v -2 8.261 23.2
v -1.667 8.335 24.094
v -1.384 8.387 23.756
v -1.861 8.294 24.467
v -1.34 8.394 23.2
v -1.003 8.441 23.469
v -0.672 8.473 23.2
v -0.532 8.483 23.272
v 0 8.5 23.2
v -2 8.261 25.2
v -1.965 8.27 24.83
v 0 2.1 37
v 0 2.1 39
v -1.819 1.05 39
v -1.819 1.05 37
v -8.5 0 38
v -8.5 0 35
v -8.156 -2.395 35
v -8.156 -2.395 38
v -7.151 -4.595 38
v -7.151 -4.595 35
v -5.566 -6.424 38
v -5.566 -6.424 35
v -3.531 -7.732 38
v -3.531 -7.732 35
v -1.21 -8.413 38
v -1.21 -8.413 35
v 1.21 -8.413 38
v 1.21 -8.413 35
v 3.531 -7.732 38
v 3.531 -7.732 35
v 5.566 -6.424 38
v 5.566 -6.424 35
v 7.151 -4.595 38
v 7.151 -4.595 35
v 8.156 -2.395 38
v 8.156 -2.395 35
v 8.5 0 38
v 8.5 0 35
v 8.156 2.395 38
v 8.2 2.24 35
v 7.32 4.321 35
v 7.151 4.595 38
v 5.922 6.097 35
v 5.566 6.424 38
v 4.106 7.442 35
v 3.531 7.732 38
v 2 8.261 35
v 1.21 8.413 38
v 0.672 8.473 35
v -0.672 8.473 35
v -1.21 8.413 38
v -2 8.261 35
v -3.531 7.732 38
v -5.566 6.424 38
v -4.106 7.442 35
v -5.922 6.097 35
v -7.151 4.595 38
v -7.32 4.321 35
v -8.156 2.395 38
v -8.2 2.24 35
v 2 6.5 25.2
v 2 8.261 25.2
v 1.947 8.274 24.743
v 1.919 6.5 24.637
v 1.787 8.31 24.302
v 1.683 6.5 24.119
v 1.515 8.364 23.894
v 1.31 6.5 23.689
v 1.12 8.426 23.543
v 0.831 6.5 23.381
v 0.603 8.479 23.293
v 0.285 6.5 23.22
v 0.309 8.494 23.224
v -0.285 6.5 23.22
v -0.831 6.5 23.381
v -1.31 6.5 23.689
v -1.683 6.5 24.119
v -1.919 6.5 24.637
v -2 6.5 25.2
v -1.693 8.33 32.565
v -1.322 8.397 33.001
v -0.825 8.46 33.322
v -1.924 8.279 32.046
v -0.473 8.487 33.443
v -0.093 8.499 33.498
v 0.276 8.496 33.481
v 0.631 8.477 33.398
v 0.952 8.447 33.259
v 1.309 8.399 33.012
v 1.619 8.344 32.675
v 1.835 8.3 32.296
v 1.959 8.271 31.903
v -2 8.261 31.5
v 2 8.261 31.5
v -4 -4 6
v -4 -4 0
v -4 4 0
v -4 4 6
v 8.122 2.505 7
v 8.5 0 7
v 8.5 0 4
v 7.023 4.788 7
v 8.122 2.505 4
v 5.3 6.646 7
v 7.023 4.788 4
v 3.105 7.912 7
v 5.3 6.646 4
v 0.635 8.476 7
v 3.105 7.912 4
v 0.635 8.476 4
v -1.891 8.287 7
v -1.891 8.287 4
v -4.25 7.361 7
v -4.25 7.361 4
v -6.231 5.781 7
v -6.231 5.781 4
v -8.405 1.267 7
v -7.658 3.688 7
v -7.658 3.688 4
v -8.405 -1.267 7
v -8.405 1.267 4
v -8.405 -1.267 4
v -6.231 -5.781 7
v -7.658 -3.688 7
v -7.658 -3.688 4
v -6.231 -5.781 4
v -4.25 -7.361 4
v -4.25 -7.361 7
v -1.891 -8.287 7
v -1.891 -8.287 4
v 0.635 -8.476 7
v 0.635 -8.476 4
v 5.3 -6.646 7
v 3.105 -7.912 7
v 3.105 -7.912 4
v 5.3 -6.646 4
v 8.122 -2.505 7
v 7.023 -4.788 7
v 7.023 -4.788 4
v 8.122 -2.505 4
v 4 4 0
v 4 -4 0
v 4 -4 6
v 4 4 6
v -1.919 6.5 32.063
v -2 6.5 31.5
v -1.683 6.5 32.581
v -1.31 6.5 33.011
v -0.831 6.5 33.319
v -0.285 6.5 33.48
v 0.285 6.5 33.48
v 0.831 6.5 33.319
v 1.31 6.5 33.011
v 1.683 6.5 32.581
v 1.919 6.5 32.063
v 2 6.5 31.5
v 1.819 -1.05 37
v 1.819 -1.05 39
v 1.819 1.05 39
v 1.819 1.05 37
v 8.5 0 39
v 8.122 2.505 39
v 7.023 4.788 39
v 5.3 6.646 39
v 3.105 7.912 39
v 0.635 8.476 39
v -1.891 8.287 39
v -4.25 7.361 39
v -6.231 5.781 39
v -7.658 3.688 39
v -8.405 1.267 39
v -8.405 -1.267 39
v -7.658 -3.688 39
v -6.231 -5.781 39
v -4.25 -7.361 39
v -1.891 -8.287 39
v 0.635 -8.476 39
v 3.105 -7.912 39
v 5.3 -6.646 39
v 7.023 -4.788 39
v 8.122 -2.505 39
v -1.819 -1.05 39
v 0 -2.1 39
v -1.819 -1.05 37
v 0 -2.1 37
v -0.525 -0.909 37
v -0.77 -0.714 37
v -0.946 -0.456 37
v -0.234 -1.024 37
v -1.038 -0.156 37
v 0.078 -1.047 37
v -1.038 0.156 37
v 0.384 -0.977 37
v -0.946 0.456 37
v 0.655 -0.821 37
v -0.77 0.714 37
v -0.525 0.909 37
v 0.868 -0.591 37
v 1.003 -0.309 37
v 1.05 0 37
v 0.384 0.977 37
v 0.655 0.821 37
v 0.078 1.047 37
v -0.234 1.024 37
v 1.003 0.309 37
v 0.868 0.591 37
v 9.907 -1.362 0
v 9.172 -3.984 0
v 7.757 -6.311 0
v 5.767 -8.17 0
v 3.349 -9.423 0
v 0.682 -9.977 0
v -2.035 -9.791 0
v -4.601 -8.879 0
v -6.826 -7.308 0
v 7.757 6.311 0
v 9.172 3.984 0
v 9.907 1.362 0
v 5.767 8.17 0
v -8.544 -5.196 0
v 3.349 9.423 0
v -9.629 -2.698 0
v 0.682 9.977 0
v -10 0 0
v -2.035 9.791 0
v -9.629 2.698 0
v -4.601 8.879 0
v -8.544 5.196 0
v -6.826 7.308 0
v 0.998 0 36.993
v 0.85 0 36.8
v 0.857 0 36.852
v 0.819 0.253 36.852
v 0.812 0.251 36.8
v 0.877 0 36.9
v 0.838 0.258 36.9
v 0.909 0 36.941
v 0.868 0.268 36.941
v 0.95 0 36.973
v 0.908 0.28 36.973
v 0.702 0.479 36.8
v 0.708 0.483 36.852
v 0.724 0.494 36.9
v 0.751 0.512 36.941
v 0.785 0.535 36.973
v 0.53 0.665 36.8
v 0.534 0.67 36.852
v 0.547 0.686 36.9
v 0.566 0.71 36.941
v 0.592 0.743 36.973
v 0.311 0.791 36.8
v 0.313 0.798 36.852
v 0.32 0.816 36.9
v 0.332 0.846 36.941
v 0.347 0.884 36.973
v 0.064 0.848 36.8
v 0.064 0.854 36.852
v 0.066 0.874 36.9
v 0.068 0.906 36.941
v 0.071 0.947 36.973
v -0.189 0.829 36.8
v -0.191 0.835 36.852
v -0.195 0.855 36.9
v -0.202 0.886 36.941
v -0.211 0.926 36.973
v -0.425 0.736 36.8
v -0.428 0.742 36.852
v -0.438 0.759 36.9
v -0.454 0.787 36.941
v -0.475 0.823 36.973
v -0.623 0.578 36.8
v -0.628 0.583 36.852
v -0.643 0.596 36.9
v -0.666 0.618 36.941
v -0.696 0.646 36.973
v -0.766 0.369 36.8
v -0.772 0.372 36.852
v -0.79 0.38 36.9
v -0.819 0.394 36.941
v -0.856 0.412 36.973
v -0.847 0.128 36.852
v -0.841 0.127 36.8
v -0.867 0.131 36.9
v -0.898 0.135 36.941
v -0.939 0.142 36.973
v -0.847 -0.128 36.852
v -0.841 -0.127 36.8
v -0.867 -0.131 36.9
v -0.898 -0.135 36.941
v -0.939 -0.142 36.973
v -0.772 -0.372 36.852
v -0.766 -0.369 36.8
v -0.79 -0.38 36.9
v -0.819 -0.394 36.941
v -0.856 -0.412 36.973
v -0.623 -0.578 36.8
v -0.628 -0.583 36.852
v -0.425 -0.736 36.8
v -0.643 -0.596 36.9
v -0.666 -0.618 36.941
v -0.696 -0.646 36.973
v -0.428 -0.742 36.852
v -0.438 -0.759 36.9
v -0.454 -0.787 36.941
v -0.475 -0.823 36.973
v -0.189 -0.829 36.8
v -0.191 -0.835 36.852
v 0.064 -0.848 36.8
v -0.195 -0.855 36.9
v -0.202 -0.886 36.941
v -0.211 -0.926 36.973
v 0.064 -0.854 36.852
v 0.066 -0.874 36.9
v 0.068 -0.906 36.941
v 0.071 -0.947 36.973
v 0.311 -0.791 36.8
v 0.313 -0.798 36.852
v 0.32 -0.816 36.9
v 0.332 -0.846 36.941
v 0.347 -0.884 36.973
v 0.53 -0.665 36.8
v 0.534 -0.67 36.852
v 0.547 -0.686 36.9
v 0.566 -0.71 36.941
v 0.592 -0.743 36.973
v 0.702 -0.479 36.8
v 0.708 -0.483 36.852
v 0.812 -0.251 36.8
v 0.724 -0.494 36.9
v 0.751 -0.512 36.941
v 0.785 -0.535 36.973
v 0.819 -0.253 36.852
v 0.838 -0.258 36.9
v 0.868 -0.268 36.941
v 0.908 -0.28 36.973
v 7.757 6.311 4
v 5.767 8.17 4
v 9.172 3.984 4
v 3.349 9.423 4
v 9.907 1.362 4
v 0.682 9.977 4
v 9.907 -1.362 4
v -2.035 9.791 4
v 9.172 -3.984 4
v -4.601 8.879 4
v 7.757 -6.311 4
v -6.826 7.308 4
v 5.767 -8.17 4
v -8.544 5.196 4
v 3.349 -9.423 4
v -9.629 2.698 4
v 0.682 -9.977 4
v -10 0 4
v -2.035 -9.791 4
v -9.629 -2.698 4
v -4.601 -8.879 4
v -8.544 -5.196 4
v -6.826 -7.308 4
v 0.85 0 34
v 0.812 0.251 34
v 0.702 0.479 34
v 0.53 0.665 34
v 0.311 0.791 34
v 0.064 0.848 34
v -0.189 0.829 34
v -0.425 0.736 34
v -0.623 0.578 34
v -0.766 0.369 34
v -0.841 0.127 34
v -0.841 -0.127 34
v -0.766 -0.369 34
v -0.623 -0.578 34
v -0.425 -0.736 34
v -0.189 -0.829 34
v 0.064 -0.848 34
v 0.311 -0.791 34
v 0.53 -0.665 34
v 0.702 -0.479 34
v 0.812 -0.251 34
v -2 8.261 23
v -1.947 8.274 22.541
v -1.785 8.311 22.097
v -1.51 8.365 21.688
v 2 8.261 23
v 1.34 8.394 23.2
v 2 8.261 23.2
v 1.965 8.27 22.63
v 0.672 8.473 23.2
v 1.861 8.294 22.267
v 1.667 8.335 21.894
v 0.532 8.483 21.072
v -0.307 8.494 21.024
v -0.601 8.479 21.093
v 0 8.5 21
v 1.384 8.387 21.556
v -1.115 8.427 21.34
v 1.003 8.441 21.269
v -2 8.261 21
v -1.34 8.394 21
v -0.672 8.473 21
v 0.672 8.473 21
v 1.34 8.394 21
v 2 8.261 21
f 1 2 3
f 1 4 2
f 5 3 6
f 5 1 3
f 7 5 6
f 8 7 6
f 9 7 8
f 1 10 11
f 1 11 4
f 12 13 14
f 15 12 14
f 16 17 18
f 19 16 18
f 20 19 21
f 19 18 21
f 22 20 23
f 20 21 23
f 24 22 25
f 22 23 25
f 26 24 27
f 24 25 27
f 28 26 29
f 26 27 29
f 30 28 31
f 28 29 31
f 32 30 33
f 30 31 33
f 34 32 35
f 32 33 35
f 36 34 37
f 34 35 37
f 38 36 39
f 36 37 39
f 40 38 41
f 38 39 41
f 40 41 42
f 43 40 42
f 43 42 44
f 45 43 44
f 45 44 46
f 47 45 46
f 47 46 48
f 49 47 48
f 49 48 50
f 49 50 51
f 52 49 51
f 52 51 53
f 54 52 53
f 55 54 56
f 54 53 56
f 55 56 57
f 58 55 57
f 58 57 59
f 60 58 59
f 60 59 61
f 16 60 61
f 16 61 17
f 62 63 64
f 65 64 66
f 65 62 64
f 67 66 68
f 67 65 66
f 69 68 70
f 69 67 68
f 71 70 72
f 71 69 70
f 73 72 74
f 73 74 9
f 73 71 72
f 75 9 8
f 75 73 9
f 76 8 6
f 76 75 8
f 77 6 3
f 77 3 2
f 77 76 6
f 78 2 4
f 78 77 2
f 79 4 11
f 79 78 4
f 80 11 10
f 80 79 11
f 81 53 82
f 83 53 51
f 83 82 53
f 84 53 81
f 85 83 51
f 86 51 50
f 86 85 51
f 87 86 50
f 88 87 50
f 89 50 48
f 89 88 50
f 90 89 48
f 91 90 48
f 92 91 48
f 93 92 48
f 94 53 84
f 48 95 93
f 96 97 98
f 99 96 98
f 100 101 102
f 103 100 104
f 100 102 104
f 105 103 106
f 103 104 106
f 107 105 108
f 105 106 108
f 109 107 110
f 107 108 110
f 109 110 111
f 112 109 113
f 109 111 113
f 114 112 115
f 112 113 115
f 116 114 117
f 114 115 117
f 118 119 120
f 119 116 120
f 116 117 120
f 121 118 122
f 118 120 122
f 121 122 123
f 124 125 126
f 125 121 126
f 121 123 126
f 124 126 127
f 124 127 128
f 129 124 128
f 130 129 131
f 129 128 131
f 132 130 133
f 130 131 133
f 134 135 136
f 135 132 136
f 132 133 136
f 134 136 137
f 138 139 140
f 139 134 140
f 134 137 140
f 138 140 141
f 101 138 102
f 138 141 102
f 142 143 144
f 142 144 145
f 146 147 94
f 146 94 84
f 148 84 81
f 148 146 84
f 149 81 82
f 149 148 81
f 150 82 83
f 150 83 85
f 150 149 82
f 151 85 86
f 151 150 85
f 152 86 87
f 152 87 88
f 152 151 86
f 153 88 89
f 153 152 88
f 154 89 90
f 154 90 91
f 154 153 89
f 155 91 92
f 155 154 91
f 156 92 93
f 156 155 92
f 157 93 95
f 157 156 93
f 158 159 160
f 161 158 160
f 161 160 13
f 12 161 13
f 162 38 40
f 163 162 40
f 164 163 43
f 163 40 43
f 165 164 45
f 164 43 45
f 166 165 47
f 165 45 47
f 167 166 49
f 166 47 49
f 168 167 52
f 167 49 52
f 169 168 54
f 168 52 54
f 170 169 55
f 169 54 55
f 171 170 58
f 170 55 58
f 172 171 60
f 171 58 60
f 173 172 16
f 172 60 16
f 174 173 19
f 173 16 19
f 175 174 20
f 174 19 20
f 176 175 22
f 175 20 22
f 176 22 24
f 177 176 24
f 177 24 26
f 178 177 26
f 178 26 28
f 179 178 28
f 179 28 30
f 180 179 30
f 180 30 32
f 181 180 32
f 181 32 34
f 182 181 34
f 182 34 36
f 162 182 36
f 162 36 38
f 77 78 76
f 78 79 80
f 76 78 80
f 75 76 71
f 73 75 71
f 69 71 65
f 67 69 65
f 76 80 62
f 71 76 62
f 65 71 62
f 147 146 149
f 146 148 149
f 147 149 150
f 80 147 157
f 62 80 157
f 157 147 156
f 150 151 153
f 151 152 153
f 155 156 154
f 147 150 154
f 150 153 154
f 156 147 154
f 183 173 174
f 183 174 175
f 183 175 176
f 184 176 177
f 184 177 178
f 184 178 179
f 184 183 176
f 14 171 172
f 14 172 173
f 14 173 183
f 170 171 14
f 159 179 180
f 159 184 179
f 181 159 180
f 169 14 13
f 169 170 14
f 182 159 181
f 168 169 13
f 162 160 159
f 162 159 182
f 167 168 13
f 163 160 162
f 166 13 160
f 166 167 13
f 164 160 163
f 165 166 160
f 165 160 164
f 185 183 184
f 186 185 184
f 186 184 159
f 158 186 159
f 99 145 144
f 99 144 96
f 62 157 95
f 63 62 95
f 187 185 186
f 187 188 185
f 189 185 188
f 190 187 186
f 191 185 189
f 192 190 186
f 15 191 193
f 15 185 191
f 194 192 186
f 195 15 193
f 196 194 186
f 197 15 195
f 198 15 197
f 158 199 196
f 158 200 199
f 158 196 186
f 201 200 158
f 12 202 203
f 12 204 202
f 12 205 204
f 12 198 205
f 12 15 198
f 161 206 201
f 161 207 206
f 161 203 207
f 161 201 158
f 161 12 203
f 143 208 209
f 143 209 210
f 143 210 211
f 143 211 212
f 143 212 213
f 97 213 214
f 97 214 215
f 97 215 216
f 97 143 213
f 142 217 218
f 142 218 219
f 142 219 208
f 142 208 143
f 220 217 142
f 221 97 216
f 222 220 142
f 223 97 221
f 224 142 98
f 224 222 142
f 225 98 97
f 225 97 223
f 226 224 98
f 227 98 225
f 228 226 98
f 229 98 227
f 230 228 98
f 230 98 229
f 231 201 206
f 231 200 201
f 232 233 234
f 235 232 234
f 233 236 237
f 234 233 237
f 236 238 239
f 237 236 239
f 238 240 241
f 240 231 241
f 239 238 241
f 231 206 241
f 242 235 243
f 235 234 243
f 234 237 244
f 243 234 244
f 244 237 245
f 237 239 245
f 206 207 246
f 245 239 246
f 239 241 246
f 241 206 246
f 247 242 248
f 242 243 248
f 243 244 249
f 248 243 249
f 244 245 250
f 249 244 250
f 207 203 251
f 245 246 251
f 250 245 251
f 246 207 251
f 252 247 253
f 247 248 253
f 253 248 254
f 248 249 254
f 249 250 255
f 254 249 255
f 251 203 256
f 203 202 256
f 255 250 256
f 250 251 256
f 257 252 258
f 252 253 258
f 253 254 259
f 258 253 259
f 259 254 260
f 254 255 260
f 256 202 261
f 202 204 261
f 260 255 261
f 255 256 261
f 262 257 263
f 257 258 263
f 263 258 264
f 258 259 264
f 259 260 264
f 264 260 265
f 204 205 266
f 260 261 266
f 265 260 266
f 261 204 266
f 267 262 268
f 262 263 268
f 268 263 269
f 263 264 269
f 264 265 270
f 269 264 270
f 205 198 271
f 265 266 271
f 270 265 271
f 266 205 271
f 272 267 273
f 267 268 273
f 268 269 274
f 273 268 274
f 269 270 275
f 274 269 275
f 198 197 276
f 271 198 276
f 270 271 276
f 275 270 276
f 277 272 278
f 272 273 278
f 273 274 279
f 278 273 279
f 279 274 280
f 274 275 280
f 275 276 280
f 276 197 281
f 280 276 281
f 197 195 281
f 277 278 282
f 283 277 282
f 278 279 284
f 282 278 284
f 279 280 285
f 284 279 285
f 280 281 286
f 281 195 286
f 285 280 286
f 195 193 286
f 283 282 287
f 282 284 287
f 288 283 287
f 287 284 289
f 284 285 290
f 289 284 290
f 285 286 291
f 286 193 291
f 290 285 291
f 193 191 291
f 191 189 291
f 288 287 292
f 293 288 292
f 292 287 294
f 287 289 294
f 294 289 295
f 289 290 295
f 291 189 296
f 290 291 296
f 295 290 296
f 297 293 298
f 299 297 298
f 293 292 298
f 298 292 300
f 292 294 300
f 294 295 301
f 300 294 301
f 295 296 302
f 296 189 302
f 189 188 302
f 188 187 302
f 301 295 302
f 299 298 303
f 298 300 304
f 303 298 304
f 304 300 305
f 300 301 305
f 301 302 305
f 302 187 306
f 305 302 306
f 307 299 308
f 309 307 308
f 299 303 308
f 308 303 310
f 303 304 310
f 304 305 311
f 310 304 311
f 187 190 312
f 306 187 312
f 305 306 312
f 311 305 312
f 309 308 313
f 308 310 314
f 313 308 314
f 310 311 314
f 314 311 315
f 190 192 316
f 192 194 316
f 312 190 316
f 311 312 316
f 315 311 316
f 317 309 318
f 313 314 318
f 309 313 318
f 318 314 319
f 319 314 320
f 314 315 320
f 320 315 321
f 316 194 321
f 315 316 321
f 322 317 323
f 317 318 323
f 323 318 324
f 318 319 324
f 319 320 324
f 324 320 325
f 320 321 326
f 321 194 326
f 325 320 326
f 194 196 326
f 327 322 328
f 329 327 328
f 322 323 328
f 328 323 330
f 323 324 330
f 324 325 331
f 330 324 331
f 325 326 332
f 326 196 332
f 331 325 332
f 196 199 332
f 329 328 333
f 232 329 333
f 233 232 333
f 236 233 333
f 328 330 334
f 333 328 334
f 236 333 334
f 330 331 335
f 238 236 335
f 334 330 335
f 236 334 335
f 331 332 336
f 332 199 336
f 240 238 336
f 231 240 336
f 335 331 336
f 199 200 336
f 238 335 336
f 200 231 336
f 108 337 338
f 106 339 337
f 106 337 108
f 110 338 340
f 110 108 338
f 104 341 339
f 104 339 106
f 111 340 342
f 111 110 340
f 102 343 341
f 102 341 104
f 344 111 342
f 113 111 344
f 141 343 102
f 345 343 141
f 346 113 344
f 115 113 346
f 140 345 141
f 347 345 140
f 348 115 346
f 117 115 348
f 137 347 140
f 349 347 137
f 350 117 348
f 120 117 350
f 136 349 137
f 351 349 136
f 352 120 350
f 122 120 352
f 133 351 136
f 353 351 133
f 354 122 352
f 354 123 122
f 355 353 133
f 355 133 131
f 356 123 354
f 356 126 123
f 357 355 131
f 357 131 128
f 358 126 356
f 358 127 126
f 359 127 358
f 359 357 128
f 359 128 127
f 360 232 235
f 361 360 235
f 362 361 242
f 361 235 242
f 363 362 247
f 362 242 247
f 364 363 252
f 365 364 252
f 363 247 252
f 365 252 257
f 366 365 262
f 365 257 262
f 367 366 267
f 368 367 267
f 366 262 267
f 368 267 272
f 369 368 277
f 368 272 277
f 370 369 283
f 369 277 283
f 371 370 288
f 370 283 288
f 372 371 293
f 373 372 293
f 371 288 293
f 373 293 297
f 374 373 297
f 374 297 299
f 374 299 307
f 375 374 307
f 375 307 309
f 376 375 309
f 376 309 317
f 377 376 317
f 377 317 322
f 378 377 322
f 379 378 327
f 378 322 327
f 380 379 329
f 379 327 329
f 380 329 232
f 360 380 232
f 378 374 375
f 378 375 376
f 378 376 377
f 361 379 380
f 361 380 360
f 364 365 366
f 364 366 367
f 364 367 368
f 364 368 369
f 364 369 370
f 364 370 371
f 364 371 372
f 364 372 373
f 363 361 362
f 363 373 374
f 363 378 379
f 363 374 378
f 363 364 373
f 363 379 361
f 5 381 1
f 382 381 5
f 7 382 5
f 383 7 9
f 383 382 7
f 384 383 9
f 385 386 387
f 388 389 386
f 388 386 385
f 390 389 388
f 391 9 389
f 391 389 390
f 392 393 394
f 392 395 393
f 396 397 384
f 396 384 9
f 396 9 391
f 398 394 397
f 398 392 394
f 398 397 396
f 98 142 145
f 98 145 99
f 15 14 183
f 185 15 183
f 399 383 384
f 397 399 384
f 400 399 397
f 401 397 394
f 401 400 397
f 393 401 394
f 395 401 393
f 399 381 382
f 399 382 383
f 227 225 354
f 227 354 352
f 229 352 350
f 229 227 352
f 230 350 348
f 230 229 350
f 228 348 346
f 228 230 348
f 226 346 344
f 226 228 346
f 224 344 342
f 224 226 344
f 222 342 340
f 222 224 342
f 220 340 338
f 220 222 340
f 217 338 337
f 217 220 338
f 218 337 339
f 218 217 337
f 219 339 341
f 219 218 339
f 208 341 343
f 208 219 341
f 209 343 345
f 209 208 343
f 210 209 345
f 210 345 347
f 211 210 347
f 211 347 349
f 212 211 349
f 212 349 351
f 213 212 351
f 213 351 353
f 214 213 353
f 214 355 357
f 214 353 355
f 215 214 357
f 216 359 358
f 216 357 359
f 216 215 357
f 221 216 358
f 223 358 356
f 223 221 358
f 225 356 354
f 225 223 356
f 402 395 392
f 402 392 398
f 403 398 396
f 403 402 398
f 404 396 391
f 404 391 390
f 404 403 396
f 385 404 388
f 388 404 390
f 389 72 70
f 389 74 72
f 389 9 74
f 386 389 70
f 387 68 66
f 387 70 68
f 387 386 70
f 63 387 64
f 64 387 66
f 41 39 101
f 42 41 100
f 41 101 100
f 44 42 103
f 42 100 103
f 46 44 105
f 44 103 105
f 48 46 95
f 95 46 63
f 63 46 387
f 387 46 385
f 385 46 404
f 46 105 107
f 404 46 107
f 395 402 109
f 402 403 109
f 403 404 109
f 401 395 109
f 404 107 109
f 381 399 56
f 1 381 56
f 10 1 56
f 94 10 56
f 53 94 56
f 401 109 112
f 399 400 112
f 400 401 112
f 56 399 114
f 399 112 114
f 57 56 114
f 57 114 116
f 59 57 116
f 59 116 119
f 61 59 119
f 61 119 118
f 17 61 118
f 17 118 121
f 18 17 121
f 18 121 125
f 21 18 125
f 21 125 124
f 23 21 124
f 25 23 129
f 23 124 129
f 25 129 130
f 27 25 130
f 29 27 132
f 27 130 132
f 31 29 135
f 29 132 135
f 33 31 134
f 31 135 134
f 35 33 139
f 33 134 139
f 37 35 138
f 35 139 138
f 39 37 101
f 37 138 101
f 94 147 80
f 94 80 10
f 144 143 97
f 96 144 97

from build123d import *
from build123d.topology import SkipClean

# Parameters (mm, degrees)
SKETCH_1_R           = 8.5
EXTRUDE_1_DEPTH      = 35
SKETCH_3_W           = 4
SKETCH_3_H           = 4
CUT_EXTRUDE_1_DEPTH  = 14
EXTRUDE_2_REACH      = 41.016
EXTRUDE_2_END_RADIUS = 8.5
EXTRUDE_3_REACH      = 41.016
EXTRUDE_3_END_RADIUS = 8.5
SKETCH_6_R           = 10
SKETCH_6_R_2         = 8.5
EXTRUDE_4_DEPTH      = 7
SKETCH_7_R           = 8.5
EXTRUDE_5_DEPTH      = 3
EXTRUDE_6_REACH      = 44.617
EXTRUDE_6_END_RADIUS = 8.5
CUT_EXTRUDE_2_DEPTH  = 43.617484675
FILLET_1_R           = 2
CUT_EXTRUDE_START    = -3
SKETCH_10_R          = 10
SKETCH_10_R_2        = 8.5
CUT_EXTRUDE_3_DEPTH  = 3
SKETCH_11_R          = 8.5
EXTRUDE_7_DEPTH      = 1
SKETCH_12_R          = 1
CUT_EXTRUDE_4_DEPTH  = 5
CUT_EXTRUDE_5_DEPTH  = 2
EXTRUDE_START        = 3
SKETCH_14_R          = 1
SKETCH_14_R_2        = 0.85
EXTRUDE_8_DEPTH      = 3
FILLET_2_R           = 0.2
SKETCH_15_W          = 8
SKETCH_15_H          = 8
CUT_EXTRUDE_6_DEPTH  = 6


with BuildPart() as part:
    # 草图1 → 凸台-拉伸1 (new body)
    with BuildSketch(Plane.XY):
        Circle(SKETCH_1_R)
    extrude(amount=EXTRUDE_1_DEPTH)

    # 草图3 → 切除-拉伸1 (cut)
    with BuildSketch(Plane.XY.offset(35)):
        with Locations((0, 8.5)):
            Rectangle(SKETCH_3_W, SKETCH_3_H)
    extrude(amount=-CUT_EXTRUDE_1_DEPTH, mode=Mode.SUBTRACT)

    # 凸台-拉伸2: up to this cylinder (the profile starts inside it)
    with SkipClean():  # the faces are left unmerged after this step: merging them gives an invalid solid
        extrude_2_end = Plane(origin=(0, 0, 21.446736), z_dir=(0, 0, -1)) * Cylinder(EXTRUDE_2_END_RADIUS, 100.032, mode=Mode.PRIVATE)
        # 草图4 → 凸台-拉伸2 (add, up to the surface)
        with BuildSketch(Plane(origin=(0, 6.5, 0), x_dir=(1, 0, 0), z_dir=(0, 1, 0)), mode=Mode.PRIVATE) as extrude_2_sk1:
            with BuildLine():
                Line((2, -21), (0, -21))
                ThreePointArc((0, -21), (1.414213562, -21.585786438), (2, -23))
                Line((2, -23), (2, -21))
            make_face()
        extrude_2_tool1 = extrude(extrude_2_sk1.sketch, amount=EXTRUDE_2_REACH, mode=Mode.PRIVATE) & extrude_2_end
        add(extrude_2_tool1.solids().sort_by_distance((1.553264, 6.5, 21.446736))[0])
        # 草图4 → 凸台-拉伸2 (add, up to the surface)
        with BuildSketch(Plane(origin=(0, 6.5, 0), x_dir=(1, 0, 0), z_dir=(0, 1, 0)), mode=Mode.PRIVATE) as extrude_2_sk2:
            with BuildLine():
                Line((-2, -21), (-2, -23))
                ThreePointArc((-2, -23), (-1.414213562, -21.585786438), (0, -21))
                Line((0, -21), (-2, -21))
            make_face()
        extrude_2_tool2 = extrude(extrude_2_sk2.sketch, amount=EXTRUDE_2_REACH, mode=Mode.PRIVATE) & extrude_2_end
        add(extrude_2_tool2.solids().sort_by_distance((-1.553264, 6.5, 21.446736))[0])

    # 凸台-拉伸3: up to this cylinder (the profile starts inside it)
    with SkipClean():  # the faces are left unmerged after this step: merging them gives an invalid solid
        extrude_3_end = Plane(origin=(0, 0, 32.762904), z_dir=(0, 0, -1)) * Cylinder(EXTRUDE_3_END_RADIUS, 100.032, mode=Mode.PRIVATE)
        # 草图5 → 凸台-拉伸3 (add, up to the surface)
        with BuildSketch(Plane(origin=(0, 6.5, 0), x_dir=(1, 0, 0), z_dir=(0, 1, 0)), mode=Mode.PRIVATE) as extrude_3_sk1:
            with BuildLine():
                Line((-2, -29), (-2, -35))
                Line((-2, -35), (2, -35))
                Line((2, -35), (2, -29))
                ThreePointArc((2, -29), (0, -31), (-2, -29))
            make_face()
        extrude_3_tool1 = extrude(extrude_3_sk1.sketch, amount=EXTRUDE_3_REACH, mode=Mode.PRIVATE) & extrude_3_end
        add(extrude_3_tool1.solids().sort_by_distance((0, 6.5, 32.762904))[0])

    # 草图6 → 凸台-拉伸4 (add)
    with BuildSketch(Plane(origin=(0, 0, 0), x_dir=(-1, 0, 0), z_dir=(0, 0, -1))):
        Circle(SKETCH_6_R)
        Circle(SKETCH_6_R_2, mode=Mode.SUBTRACT)
    extrude(amount=-EXTRUDE_4_DEPTH)

    # 草图7 → 凸台-拉伸5 (add)
    with SkipClean():  # the faces are left unmerged after this step: merging them gives an invalid solid
        with BuildSketch(Plane.XY.offset(35)):
            with Locations(Location((0, 0, 0), (0, 0, 180))):
                Circle(SKETCH_7_R)
        extrude(amount=EXTRUDE_5_DEPTH)

    # 凸台-拉伸6: up to this cylinder (the profile starts inside it)
    with SkipClean():  # the faces are left unmerged after this step: merging them gives an invalid solid
        extrude_6_end = Plane(origin=(0, 0, 22.258337), z_dir=(0, 0, -1)) * Cylinder(EXTRUDE_6_END_RADIUS, 107.234, mode=Mode.PRIVATE)
        # 草图8 → 凸台-拉伸6 (add, up to the surface)
        with BuildSketch(Plane(origin=(0, 6.5, 0), x_dir=(1, 0, 0), z_dir=(0, 1, 0)), mode=Mode.PRIVATE) as extrude_6_sk1:
            with BuildLine():
                Line((-2, -23), (-2, -23.2))
                Line((-2, -23.2), (2, -23.2))
                Line((2, -23.2), (2, -23))
                ThreePointArc((2, -23), (0, -21), (-2, -23))
            make_face()
        extrude_6_tool1 = extrude(extrude_6_sk1.sketch, amount=EXTRUDE_6_REACH, mode=Mode.PRIVATE) & extrude_6_end
        add(extrude_6_tool1.solids().sort_by_distance((0, 6.5, 22.258337))[0])

    # 草图9 → 切除-拉伸2 (cut, through all)
    with SkipClean():  # the faces are left unmerged after this step: merging them gives an invalid solid
        with BuildSketch(Plane(origin=(0, 6.5, 0), x_dir=(1, 0, 0), z_dir=(0, 1, 0))):
            with BuildLine():
                Line((-2, -29), (-2, -29.5))
                Line((-2, -29.5), (-2, -31.5))
                ThreePointArc((-2, -31.5), (0, -33.5), (2, -31.5))
                Line((2, -31.5), (2, -29.5))
                Line((2, -29.5), (2, -29))
                Line((2, -29), (-2, -29))
            make_face()
        extrude(amount=CUT_EXTRUDE_2_DEPTH, mode=Mode.SUBTRACT)

    # 圆角1
    # the kernel refuses this fillet: 2 mm, written as the material it adds along each edge
    with BuildSketch(Plane(origin=(-2, 1.5, 23.2), x_dir=(0, 0, 1), z_dir=(0, 1, 0))) as fillet_1_piece_1_section:
        with BuildLine():
            CenterArc((FILLET_1_R, FILLET_1_R), FILLET_1_R, 180, 90)
            Line((0, FILLET_1_R), (0, 0))
            Line((0, 0), (FILLET_1_R, 0))
        make_face()
    fillet_1_piece_1 = extrude(amount=11.761355821, mode=Mode.PRIVATE)
    fillet_1_piece_1 = fillet_1_piece_1 & Plane(origin=(0, 0, 23.652790229), x_dir=(1, 0, 0), z_dir=(0, 0, -1)) * Cylinder(8.5, 32, mode=Mode.PRIVATE)
    add(fillet_1_piece_1)
    with BuildSketch(Plane(origin=(2, 1.5, 23.2), x_dir=(0, 0, 1), z_dir=(0, 1, 0))) as fillet_1_piece_2_section:
        with BuildLine():
            CenterArc((FILLET_1_R, -FILLET_1_R), FILLET_1_R, 90, 90)
            Line((0, -FILLET_1_R), (0, 0))
            Line((0, 0), (FILLET_1_R, 0))
        make_face()
    fillet_1_piece_2 = extrude(amount=11.761355821, mode=Mode.PRIVATE)
    fillet_1_piece_2 = fillet_1_piece_2 & Plane(origin=(0, 0, 23.652790229), x_dir=(1, 0, 0), z_dir=(0, 0, -1)) * Cylinder(8.5, 32, mode=Mode.PRIVATE)
    add(fillet_1_piece_2)

    # 草图10 → 切除-拉伸3 (cut)
    with BuildSketch(Plane.XY.offset(7).offset(CUT_EXTRUDE_START)):
        with Locations(Location((0, 0, 0), (0, 0, 180))):
            Circle(SKETCH_10_R)
        Circle(SKETCH_10_R_2, mode=Mode.SUBTRACT)
    extrude(amount=CUT_EXTRUDE_3_DEPTH, mode=Mode.SUBTRACT)

    # 草图11 → 凸台-拉伸7 (add)
    with BuildSketch(Plane.XY.offset(38)):
        Circle(SKETCH_11_R)
    extrude(amount=EXTRUDE_7_DEPTH)

    # 草图12 → 切除-拉伸4 (cut)
    with BuildSketch(Plane.XY.offset(39)):
        Circle(SKETCH_12_R)
    extrude(amount=-CUT_EXTRUDE_4_DEPTH, mode=Mode.SUBTRACT)

    # 草图13 → 切除-拉伸5 (cut)
    with BuildSketch(Plane.XY.offset(39)):
        Polygon((0, 2.1), (-1.818653348, 1.05), (-1.818653348, -1.05), (0, -2.1), (1.818653348, -1.05), (1.818653348, 1.05), align=None)
    extrude(amount=-CUT_EXTRUDE_5_DEPTH, mode=Mode.SUBTRACT)

    # 草图14 → 凸台-拉伸8 (add)
    with BuildSketch(Plane.XY.offset(34).offset(EXTRUDE_START)):
        Circle(SKETCH_14_R)
        Circle(SKETCH_14_R_2, mode=Mode.SUBTRACT)
    extrude(amount=-EXTRUDE_8_DEPTH)

    # 圆角2
    fillet_2_edges = [part.edges().sort_by_distance(p)[0] for p in [
        (-0.85, 0, 37),
    ]]
    fillet(fillet_2_edges, radius=FILLET_2_R)

    # 草图15 → 切除-拉伸6 (cut)
    with BuildSketch(Plane(origin=(0, 0, 0), x_dir=(-1, 0, 0), z_dir=(0, 0, -1))):
        Rectangle(SKETCH_15_W, SKETCH_15_H)
    extrude(amount=-CUT_EXTRUDE_6_DEPTH, mode=Mode.SUBTRACT)


solid = part.part
